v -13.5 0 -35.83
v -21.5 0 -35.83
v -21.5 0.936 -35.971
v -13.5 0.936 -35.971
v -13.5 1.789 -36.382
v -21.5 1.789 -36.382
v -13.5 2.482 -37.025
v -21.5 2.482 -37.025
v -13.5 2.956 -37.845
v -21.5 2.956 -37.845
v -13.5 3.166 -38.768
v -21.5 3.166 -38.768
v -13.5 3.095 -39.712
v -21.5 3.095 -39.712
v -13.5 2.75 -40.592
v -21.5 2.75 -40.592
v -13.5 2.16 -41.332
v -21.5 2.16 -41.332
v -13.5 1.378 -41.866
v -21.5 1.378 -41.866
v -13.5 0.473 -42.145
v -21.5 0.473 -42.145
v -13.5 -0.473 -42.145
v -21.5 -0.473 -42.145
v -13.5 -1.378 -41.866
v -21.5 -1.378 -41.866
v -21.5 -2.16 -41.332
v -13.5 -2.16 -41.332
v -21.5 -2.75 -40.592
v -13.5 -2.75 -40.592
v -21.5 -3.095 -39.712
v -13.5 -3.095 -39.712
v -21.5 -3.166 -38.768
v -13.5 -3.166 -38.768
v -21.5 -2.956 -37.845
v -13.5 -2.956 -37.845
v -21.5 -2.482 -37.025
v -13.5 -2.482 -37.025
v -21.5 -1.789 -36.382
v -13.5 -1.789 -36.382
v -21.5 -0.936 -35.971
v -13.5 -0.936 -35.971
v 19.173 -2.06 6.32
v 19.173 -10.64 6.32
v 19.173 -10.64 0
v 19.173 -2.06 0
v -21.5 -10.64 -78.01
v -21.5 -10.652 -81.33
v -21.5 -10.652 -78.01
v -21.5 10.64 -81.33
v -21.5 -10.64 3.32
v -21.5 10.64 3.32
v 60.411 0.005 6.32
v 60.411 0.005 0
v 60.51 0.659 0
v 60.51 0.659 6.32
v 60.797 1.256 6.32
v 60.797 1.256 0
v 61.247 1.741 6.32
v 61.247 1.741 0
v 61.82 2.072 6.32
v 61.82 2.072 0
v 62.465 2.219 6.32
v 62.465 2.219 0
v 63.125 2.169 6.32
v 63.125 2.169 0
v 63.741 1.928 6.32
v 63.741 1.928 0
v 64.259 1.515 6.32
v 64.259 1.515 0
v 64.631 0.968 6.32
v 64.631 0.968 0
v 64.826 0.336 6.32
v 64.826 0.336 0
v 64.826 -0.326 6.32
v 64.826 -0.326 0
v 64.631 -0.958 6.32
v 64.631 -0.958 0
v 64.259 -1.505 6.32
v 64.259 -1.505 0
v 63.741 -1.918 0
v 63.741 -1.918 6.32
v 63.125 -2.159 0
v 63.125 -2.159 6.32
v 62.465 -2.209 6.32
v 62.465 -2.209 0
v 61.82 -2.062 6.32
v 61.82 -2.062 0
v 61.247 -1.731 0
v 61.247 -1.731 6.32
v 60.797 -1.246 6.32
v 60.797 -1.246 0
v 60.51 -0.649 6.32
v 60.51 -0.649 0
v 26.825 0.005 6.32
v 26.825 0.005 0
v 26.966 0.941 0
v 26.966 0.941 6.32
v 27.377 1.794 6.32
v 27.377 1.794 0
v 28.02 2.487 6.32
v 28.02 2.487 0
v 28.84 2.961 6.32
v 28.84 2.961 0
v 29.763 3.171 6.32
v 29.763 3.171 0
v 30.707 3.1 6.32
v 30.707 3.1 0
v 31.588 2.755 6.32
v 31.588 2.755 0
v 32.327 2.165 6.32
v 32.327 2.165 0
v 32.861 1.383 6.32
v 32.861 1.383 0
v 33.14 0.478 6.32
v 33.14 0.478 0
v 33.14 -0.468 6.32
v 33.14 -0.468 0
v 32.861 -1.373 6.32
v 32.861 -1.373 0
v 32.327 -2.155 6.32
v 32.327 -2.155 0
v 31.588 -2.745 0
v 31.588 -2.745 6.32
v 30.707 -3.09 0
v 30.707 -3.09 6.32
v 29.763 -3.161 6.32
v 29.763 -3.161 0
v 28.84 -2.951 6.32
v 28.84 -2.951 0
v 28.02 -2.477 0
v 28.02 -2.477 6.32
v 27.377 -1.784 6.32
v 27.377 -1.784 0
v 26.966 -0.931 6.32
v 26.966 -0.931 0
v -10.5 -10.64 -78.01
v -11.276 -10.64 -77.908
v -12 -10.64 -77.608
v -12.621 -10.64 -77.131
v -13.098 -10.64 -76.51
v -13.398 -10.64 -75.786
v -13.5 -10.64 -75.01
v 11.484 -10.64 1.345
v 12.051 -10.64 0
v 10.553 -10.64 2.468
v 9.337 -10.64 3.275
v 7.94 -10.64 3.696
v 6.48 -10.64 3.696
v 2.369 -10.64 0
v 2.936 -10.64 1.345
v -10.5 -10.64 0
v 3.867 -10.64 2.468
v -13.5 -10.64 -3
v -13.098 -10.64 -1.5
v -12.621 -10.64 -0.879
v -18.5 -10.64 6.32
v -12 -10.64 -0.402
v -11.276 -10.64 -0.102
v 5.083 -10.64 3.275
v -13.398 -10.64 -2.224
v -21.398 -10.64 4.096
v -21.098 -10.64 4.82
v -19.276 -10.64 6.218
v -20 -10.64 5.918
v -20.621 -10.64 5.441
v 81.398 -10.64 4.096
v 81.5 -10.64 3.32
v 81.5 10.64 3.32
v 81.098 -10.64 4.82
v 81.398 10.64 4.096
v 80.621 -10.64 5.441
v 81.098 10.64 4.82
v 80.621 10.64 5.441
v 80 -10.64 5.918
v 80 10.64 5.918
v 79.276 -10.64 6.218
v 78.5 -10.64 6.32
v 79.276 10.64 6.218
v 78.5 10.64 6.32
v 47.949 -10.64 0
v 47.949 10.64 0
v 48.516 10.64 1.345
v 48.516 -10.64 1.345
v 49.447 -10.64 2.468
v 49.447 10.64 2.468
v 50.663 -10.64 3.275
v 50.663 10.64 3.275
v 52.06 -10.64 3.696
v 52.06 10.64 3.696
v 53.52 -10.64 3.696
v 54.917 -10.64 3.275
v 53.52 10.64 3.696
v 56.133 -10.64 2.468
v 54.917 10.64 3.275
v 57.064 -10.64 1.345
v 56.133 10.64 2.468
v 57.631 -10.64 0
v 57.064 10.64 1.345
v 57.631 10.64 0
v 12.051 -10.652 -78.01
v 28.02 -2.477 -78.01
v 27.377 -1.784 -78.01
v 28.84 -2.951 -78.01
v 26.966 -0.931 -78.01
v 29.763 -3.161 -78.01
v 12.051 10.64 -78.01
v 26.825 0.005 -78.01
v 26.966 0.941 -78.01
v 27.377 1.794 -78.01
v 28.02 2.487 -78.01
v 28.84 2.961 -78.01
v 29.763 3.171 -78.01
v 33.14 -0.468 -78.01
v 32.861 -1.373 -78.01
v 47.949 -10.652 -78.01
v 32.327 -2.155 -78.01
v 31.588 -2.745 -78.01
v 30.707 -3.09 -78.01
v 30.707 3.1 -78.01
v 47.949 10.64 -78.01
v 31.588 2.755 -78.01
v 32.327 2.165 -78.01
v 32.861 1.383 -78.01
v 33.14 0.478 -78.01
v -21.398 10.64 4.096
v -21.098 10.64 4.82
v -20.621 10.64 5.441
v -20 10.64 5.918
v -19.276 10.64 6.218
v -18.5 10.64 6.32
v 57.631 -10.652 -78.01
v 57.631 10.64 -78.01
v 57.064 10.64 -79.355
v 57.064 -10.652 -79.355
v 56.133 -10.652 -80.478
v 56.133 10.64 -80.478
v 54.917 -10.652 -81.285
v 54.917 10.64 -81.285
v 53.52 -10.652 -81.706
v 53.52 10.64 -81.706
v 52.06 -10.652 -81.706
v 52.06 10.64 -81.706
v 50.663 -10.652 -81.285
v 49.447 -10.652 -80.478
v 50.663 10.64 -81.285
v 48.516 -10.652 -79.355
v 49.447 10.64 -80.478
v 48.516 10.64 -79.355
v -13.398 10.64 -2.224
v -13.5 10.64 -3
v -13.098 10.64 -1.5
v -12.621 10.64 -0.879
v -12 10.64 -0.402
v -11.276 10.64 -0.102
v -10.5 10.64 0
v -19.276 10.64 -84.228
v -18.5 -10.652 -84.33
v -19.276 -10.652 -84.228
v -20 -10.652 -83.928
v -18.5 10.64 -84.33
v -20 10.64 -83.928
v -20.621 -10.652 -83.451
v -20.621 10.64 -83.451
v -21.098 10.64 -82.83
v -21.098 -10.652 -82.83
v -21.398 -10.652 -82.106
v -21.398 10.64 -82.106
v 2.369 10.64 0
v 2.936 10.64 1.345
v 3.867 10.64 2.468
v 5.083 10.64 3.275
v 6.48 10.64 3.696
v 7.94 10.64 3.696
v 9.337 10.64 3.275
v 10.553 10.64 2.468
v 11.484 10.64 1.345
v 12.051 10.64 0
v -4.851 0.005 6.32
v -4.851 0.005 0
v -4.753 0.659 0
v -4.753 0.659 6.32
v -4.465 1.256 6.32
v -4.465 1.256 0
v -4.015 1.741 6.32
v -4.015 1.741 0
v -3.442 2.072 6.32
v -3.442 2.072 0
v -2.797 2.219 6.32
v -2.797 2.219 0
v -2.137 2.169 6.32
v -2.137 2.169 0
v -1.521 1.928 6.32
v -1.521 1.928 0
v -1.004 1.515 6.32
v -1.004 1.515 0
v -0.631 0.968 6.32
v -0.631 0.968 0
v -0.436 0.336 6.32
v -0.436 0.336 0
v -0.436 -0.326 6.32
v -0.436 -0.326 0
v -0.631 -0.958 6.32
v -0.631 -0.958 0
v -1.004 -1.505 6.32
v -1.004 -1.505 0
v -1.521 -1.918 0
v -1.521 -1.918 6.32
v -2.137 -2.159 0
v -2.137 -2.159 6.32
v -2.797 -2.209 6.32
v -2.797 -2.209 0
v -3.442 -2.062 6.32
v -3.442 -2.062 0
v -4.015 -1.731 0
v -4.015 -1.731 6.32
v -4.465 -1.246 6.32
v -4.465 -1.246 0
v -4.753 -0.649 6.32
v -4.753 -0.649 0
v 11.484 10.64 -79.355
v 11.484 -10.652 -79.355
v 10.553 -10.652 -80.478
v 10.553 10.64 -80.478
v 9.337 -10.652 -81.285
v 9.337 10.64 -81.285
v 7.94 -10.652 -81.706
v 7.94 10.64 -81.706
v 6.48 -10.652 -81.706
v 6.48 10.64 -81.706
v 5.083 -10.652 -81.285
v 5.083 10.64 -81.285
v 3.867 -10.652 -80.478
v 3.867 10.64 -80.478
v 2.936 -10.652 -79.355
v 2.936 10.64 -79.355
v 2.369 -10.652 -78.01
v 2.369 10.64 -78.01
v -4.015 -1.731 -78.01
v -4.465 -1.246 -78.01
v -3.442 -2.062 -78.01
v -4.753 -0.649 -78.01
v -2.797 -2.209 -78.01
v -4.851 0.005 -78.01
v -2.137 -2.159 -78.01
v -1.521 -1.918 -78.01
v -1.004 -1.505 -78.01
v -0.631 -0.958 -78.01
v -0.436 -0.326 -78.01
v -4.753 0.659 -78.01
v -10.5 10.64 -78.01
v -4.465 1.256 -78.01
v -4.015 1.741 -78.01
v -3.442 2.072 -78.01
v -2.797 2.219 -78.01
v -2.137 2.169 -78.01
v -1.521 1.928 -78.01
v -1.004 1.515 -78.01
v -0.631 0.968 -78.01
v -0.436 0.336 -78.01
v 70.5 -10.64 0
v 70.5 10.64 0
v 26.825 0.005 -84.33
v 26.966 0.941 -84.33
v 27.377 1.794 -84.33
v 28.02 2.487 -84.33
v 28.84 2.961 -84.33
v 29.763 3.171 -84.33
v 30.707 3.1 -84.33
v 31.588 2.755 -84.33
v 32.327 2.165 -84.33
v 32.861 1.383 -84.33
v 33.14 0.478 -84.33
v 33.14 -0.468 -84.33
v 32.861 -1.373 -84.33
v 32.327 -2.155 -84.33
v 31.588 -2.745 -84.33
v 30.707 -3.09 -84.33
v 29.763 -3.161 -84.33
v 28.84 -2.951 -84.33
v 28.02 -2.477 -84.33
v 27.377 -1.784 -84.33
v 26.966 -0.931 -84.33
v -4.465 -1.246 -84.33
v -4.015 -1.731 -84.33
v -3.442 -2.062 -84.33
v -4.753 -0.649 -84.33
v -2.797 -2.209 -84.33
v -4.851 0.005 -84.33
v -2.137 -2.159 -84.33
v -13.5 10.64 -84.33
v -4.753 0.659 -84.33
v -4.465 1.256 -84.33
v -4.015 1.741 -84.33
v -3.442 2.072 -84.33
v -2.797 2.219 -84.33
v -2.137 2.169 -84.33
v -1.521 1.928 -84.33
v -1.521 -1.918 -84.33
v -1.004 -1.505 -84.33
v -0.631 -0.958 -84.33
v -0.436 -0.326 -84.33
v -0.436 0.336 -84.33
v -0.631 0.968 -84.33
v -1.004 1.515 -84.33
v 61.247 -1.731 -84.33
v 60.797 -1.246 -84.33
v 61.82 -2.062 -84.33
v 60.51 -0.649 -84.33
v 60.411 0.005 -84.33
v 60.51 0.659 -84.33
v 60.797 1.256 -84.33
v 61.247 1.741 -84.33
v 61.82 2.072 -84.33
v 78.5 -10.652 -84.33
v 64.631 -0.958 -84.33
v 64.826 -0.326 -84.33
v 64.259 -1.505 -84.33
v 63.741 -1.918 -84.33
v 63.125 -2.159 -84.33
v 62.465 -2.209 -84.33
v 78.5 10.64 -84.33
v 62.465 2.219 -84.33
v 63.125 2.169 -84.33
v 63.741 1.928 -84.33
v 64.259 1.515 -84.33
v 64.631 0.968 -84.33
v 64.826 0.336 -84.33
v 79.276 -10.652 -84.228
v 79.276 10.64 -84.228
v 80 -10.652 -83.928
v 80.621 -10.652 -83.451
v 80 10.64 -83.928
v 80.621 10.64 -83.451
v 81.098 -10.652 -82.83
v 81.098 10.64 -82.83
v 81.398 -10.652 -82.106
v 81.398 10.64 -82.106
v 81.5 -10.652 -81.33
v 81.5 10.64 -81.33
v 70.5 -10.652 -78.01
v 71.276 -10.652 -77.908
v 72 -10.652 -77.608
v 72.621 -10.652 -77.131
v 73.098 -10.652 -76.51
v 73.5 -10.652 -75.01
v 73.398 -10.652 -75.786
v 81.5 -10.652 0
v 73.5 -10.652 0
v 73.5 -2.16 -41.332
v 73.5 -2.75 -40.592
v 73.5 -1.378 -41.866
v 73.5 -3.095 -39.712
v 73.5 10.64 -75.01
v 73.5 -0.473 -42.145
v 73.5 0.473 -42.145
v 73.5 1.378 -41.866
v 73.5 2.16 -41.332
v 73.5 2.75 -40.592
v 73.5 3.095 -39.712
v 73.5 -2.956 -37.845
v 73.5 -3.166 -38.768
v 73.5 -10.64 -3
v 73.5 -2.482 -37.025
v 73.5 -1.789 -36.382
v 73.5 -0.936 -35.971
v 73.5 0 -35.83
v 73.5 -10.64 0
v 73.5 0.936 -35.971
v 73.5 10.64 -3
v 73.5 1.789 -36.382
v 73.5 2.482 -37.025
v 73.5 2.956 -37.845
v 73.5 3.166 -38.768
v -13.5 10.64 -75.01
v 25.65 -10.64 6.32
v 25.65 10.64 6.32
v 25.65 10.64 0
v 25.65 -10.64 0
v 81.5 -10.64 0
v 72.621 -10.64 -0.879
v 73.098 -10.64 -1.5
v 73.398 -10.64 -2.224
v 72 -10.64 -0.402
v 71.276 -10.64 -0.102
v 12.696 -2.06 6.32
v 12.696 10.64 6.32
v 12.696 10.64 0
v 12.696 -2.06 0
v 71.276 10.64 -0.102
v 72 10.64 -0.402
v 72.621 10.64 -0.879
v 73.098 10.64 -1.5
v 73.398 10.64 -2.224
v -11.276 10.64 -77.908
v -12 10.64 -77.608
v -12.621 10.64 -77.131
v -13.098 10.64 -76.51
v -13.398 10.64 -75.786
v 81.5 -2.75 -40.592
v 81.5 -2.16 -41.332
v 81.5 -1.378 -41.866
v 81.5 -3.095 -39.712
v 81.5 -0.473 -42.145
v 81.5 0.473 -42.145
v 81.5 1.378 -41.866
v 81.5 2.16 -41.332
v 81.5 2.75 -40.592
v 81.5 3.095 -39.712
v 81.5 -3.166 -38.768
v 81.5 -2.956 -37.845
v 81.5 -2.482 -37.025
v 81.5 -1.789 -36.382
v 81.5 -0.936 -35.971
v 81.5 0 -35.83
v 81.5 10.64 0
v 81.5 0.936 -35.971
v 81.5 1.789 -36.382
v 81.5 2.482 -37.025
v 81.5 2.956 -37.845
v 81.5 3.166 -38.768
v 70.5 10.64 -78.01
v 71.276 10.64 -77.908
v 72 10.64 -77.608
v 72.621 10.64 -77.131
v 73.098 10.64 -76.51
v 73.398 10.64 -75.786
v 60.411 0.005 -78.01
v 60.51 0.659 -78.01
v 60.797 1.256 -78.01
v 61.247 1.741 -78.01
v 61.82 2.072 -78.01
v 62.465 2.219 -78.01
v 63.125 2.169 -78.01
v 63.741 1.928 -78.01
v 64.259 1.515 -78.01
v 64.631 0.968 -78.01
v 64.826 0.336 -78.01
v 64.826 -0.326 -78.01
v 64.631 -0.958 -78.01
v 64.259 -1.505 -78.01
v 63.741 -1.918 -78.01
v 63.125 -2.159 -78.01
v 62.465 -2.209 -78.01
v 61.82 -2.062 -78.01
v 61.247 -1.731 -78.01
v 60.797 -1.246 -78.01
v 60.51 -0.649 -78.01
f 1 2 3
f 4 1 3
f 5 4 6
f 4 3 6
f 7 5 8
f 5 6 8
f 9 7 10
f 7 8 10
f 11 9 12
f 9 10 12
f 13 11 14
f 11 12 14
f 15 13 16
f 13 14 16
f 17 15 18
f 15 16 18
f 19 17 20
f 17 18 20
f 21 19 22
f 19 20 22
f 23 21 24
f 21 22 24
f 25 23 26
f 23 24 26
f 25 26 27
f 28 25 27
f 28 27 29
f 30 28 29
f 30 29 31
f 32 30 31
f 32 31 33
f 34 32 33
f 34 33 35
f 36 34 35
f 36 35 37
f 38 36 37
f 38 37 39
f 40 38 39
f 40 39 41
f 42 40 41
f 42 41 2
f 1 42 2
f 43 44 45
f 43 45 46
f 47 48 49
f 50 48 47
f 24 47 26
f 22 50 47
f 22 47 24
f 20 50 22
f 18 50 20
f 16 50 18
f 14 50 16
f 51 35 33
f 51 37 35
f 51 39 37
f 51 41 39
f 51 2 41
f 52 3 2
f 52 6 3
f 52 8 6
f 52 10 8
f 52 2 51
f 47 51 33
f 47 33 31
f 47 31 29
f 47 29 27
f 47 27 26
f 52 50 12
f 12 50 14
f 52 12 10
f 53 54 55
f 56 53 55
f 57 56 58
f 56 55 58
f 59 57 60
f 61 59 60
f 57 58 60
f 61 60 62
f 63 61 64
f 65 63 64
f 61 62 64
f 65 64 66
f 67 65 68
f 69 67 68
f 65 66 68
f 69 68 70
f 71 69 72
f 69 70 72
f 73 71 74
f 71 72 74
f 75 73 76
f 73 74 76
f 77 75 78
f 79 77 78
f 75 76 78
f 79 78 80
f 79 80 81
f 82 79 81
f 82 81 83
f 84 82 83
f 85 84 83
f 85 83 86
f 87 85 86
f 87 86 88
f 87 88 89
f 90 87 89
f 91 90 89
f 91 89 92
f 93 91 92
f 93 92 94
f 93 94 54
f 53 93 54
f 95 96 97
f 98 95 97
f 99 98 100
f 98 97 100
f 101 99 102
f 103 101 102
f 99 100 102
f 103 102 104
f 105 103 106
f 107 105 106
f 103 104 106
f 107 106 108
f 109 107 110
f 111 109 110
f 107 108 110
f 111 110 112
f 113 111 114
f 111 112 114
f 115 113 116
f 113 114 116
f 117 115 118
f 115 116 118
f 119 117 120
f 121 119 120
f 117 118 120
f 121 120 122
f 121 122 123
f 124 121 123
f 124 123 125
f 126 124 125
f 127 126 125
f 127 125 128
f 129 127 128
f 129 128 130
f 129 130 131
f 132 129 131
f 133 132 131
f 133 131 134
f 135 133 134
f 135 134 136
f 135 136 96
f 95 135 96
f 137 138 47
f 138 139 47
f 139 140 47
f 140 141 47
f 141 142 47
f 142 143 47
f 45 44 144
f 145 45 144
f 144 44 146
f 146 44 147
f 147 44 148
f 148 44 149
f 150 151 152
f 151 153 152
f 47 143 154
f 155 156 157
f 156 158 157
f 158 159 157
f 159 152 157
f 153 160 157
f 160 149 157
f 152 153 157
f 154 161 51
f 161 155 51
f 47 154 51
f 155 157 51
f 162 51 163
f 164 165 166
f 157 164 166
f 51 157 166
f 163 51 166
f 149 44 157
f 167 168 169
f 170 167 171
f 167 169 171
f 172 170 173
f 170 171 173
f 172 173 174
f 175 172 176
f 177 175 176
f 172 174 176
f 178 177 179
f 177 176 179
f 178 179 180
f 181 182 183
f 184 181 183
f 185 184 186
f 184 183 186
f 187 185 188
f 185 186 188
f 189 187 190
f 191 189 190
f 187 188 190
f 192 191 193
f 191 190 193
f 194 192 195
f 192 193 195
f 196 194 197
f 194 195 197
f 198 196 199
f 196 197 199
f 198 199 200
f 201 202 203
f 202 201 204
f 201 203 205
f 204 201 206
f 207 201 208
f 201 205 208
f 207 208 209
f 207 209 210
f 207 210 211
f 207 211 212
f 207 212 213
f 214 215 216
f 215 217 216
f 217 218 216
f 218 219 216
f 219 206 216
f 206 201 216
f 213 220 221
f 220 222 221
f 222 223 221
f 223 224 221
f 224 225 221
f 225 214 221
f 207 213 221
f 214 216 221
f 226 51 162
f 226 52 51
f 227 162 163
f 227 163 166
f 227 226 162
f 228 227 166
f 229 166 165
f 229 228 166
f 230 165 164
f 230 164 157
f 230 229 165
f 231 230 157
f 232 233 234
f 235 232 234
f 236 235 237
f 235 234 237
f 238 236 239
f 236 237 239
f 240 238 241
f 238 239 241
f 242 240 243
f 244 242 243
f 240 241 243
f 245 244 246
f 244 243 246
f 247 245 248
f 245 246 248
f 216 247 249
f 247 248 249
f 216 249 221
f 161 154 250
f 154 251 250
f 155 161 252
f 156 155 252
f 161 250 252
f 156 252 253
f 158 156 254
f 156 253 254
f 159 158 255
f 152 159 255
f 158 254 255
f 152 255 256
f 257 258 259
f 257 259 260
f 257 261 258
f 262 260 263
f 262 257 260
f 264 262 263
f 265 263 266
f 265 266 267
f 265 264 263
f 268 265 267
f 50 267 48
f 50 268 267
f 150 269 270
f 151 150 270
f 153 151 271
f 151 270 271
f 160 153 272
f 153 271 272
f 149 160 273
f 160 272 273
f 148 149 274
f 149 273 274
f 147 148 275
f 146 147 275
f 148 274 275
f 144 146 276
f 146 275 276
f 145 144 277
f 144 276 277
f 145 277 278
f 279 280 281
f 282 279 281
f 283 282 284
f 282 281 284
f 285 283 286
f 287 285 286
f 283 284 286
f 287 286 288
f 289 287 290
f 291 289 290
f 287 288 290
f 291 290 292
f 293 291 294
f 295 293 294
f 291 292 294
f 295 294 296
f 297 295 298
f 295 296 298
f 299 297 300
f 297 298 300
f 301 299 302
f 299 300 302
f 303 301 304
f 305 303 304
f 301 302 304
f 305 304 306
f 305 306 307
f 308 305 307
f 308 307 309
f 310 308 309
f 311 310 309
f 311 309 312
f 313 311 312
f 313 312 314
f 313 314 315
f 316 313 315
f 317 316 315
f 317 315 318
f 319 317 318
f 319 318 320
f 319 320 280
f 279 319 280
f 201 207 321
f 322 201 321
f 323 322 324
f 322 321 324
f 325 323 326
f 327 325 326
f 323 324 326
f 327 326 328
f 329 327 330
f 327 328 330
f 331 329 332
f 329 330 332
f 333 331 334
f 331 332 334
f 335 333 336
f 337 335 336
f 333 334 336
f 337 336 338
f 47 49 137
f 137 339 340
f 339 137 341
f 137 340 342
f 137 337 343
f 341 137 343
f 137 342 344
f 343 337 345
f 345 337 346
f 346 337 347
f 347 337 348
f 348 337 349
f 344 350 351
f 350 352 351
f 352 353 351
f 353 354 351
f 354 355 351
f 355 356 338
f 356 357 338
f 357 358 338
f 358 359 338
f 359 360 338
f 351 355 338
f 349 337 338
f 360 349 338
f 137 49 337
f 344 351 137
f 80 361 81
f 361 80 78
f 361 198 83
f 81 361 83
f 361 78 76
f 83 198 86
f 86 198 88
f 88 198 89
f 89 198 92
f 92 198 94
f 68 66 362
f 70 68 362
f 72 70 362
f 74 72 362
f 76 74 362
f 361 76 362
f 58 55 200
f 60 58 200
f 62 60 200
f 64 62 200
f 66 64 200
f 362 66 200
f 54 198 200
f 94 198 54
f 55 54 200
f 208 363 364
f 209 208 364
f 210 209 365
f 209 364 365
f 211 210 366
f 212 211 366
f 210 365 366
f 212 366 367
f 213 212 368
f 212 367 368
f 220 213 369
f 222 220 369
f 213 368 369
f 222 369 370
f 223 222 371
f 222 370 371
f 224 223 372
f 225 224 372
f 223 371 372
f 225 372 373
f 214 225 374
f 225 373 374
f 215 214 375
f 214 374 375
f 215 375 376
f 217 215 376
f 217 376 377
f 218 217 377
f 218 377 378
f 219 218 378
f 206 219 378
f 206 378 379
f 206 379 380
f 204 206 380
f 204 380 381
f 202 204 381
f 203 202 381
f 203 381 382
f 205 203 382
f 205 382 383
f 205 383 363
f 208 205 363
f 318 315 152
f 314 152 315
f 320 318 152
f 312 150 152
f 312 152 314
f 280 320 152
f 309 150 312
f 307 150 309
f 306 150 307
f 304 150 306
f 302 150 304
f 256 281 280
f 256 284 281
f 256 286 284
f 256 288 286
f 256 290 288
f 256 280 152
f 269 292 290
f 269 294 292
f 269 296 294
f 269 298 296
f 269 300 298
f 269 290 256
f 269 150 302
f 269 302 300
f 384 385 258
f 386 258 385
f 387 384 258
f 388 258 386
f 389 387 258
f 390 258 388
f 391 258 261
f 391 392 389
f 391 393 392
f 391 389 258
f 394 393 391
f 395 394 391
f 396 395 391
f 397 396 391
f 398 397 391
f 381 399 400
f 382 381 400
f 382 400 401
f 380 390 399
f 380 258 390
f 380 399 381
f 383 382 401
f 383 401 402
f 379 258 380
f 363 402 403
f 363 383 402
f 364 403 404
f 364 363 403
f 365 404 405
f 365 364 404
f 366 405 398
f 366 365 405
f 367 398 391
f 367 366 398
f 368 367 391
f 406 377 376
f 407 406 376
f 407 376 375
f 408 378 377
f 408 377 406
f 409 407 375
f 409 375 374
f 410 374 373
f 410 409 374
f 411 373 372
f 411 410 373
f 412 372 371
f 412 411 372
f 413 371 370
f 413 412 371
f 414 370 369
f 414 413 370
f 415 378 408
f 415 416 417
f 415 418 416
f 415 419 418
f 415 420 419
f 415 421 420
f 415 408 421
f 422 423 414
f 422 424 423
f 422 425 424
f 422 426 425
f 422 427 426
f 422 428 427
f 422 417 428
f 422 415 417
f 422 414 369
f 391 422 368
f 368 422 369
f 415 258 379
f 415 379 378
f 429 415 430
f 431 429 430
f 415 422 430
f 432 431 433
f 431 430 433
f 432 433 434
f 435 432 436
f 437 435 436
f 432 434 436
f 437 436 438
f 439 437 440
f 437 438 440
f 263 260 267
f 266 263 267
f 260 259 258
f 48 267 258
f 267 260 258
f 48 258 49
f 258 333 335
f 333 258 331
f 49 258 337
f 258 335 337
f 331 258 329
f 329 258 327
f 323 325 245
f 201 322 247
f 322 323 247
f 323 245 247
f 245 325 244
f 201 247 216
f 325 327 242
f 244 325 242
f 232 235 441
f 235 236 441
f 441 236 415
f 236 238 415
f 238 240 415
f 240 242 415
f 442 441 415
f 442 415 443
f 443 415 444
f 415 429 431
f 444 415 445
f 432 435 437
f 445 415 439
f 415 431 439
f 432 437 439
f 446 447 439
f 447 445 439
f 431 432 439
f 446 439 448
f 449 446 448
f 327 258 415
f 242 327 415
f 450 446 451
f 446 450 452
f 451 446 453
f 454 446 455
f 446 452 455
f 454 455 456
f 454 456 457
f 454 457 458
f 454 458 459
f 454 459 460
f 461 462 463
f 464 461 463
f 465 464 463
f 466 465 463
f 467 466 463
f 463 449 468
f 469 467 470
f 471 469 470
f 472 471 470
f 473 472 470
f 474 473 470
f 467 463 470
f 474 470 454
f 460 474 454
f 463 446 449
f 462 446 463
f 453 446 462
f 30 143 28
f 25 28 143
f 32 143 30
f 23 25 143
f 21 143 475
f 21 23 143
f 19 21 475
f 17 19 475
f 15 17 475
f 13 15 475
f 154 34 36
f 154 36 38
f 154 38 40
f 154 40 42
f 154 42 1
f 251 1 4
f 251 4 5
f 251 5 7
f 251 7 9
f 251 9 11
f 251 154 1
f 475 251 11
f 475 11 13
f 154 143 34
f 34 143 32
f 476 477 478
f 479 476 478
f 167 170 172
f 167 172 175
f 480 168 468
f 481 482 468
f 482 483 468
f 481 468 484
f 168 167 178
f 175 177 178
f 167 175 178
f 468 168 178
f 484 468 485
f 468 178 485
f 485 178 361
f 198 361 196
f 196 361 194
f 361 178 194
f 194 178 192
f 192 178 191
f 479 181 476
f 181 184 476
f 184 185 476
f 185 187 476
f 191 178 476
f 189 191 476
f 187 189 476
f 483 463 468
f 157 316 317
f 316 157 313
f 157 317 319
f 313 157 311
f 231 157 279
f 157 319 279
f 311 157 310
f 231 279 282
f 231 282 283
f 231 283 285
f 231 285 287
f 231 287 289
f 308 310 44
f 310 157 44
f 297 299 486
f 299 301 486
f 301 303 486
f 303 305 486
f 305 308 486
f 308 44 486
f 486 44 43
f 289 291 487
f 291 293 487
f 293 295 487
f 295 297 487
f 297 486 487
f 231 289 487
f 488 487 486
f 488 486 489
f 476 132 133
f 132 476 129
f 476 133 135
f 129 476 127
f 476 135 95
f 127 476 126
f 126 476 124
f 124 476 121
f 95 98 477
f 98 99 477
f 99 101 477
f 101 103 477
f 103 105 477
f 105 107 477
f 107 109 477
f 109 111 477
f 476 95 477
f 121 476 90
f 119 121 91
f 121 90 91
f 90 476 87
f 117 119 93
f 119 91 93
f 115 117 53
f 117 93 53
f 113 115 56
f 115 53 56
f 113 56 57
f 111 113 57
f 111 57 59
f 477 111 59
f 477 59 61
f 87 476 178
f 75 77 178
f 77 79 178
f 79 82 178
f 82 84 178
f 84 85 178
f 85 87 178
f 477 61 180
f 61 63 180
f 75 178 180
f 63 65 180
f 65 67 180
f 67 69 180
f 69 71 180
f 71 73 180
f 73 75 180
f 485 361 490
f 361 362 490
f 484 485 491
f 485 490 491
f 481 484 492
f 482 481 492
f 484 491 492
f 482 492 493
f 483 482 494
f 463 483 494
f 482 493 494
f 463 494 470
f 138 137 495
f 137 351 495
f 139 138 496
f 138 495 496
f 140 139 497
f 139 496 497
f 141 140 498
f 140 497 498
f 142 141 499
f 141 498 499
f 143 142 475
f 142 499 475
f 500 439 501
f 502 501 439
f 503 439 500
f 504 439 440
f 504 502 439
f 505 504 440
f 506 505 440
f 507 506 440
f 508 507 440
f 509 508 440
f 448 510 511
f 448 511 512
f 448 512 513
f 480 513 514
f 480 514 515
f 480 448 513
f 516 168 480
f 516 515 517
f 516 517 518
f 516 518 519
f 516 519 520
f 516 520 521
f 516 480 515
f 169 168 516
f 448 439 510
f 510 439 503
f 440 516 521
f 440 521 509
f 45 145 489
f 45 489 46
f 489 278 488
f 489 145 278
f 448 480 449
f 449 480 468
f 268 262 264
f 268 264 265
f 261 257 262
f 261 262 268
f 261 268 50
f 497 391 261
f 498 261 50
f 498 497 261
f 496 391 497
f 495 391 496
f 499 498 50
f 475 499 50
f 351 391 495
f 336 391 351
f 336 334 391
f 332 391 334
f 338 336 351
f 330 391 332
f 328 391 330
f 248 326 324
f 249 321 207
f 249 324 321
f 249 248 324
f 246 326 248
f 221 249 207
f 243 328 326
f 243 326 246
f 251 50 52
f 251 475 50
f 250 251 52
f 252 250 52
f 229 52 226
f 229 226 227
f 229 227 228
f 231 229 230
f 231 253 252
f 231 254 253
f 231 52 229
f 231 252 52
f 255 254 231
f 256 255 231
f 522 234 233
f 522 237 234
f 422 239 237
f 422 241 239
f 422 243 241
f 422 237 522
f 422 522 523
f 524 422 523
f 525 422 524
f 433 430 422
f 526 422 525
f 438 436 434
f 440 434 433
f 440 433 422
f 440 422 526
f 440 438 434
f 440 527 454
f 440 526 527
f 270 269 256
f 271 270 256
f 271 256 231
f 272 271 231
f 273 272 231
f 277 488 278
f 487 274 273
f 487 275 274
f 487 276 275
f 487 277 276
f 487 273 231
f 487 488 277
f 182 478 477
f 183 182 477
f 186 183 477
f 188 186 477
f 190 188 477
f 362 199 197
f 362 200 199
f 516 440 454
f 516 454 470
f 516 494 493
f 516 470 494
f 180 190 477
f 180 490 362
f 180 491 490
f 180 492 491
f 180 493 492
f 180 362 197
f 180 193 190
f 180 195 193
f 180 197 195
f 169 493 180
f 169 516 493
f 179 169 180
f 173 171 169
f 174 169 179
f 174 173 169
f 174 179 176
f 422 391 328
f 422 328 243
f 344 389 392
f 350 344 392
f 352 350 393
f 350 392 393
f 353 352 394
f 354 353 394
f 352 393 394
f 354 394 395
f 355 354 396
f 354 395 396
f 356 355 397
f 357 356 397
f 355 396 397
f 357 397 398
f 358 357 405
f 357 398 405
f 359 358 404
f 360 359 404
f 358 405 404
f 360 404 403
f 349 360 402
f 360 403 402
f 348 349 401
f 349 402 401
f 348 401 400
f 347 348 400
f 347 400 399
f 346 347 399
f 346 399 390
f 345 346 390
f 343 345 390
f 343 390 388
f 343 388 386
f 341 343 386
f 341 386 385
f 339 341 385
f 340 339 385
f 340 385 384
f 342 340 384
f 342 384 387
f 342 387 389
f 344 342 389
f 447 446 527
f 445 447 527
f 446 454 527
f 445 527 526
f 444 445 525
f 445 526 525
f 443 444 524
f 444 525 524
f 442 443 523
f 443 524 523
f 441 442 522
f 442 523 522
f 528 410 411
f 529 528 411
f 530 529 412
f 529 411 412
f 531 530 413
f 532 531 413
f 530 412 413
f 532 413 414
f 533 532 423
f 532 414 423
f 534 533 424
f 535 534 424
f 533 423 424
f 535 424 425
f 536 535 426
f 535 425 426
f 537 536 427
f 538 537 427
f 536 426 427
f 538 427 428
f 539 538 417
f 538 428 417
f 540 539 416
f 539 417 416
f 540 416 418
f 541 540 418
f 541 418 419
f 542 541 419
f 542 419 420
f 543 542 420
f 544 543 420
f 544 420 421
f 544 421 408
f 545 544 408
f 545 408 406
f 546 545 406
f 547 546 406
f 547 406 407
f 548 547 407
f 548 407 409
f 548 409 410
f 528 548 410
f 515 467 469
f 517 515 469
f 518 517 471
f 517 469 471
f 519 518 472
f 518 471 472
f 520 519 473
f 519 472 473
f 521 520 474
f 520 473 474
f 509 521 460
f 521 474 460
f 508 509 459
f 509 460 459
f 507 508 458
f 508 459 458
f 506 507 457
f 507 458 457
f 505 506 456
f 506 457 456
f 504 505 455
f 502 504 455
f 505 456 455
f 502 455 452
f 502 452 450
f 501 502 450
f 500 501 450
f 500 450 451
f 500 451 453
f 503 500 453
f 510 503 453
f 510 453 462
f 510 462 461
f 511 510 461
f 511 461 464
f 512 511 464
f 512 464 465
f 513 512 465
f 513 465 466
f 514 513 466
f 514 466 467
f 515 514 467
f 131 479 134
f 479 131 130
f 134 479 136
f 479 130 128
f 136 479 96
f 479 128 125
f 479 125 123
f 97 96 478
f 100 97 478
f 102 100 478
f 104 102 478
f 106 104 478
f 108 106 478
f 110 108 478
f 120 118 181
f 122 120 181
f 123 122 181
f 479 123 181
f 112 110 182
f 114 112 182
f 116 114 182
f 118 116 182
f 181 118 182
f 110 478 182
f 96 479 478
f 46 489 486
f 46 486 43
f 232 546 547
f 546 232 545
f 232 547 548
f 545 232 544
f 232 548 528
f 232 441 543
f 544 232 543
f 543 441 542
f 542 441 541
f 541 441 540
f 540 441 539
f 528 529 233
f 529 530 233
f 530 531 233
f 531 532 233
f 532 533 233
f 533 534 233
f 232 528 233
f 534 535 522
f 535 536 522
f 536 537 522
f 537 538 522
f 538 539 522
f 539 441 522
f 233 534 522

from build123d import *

# Parameters (mm, degrees)
SKETCH1_W           = 60
SKETCH1_H           = 6.32
BOSS_EXTRUDE1_DEPTH = 10.64
SKETCH2_R           = 5
CUT_EXTRUDE1_DEPTH  = 64.974845056
SKETCH3_W           = 6.32
SKETCH3_H           = 21.28
BOSS_EXTRUDE2_DEPTH = 21.5
SKETCH4_W           = 6.32
SKETCH4_H           = 21.28
BOSS_EXTRUDE3_DEPTH = 21.5
SKETCH5_W           = 8
SKETCH5_H           = 21.28
BOSS_EXTRUDE6_DEPTH = 84.33
SKETCH6_W           = 8
SKETCH6_H           = 21.291954735
BOSS_EXTRUDE7_DEPTH = 84.33
SKETCH7_W           = 6.32
SKETCH7_H           = 21.291954735
BOSS_EXTRUDE8_DEPTH = 95
SKETCH9_R           = 5
CUT_EXTRUDE2_DEPTH  = 120.193734049
SKETCH10_R          = 2.22
CUT_EXTRUDE3_DEPTH  = 123.364768784
FILLET1_R           = 3
SKETCH13_R          = 3.175
CUT_EXTRUDE4_DEPTH  = 123.364768784
SKETCH17_W          = 12.954
SKETCH17_H          = 7.031857888
CUT_EXTRUDE7_DEPTH  = 12.7
CUT_EXTRUDE8_REACH  = 124.365
SKETCH18_W          = 6.477
SKETCH18_H          = 8.58
SKETCH19_R          = 3.175
CUT_EXTRUDE9_DEPTH  = 134.544049061


with BuildPart() as part:
    # Sketch1 → Boss-Extrude1 (new, symmetric)
    with BuildSketch(Plane(origin=(0, 0, 0), x_dir=(1, 0, 0), z_dir=(0, 1, 0))):
        with Locations((30, -3.16)):
            Rectangle(SKETCH1_W, SKETCH1_H)
    extrude(amount=BOSS_EXTRUDE1_DEPTH, both=True)

    # Sketch2 → Cut-Extrude1 (cut, through all)
    with BuildSketch(Plane(origin=(0, 10.64, 0), x_dir=(1, 0, 0), z_dir=(0, 1, 0))):
        with Locations((7.21, 1.25)):
            Circle(SKETCH2_R)
        with Locations((52.79, 1.25)):
            Circle(SKETCH2_R)
    extrude(amount=-CUT_EXTRUDE1_DEPTH, mode=Mode.SUBTRACT)

    # Sketch3 → Boss-Extrude2 (add)
    with BuildSketch(Plane(origin=(60, 0, 0), x_dir=(0, 0, -1), z_dir=(1, 0, 0))):
        with Locations((-3.16, 0)):
            Rectangle(SKETCH3_W, SKETCH3_H)
    extrude(amount=BOSS_EXTRUDE2_DEPTH)

    # Sketch4 → Boss-Extrude3 (add)
    with BuildSketch(Plane.ZY):
        with Locations((3.16, 0)):
            Rectangle(SKETCH4_W, SKETCH4_H)
    extrude(amount=BOSS_EXTRUDE3_DEPTH)

    # Sketch5 → Boss-Extrude6 (add)
    with BuildSketch(Plane(origin=(0, 0, 0), x_dir=(-1, 0, 0), z_dir=(0, 0, -1))):
        with Locations((17.5, 0)):
            Rectangle(SKETCH5_W, SKETCH5_H)
    extrude(amount=BOSS_EXTRUDE6_DEPTH)

    # Sketch6 → Boss-Extrude7 (add)
    with BuildSketch(Plane(origin=(0, 0, 0), x_dir=(-1, 0, 0), z_dir=(0, 0, -1))):
        with Locations((-77.5, -0.005977367)):
            Rectangle(SKETCH6_W, SKETCH6_H)
    extrude(amount=BOSS_EXTRUDE7_DEPTH)

    # Sketch7 → Boss-Extrude8 (add, through all)
    with BuildSketch(Plane.ZY.offset(-73.5)):
        with Locations((-81.17, -0.005977367)):
            Rectangle(SKETCH7_W, SKETCH7_H)
    extrude(amount=BOSS_EXTRUDE8_DEPTH)

    # Sketch9 → Cut-Extrude2 (cut, through all)
    with BuildSketch(Plane(origin=(0, 10.64, 0), x_dir=(1, 0, 0), z_dir=(0, 1, 0))):
        with Locations((7.21, 76.76)):
            Circle(SKETCH9_R)
        with Locations((52.79, 76.76)):
            Circle(SKETCH9_R)
    extrude(amount=-CUT_EXTRUDE2_DEPTH, mode=Mode.SUBTRACT)

    # Sketch10 → Cut-Extrude3 (cut, through all)
    with BuildSketch(Plane(origin=(0, 0, -84.33), x_dir=(-1, 0, 0), z_dir=(0, 0, -1))):
        with Locations((-62.631229183, 0.005)):
            Circle(SKETCH10_R)
        with Locations((2.631229183, 0.005)):
            Circle(SKETCH10_R)
    extrude(amount=-CUT_EXTRUDE3_DEPTH, mode=Mode.SUBTRACT)

    # Fillet1
    fillet1_edges = [part.edges().sort_by_distance(p)[0] for p in [
        (81.5, 0, 6.32),
        (-21.5, 0, 6.32),
        (-13.5, 0, 0),
        (-21.5, -0.005977367, -84.33),
        (73.5, 0, 0),
        (81.5, -0.005977367, -84.33),
        (-13.5, 0, -78.01),
        (73.5, -0.005977367, -78.01),
    ]]
    fillet(fillet1_edges, radius=FILLET1_R)

    # Sketch13 → Cut-Extrude4 (cut, through all)
    with BuildSketch(Plane(origin=(0, 0, -84.33), x_dir=(-1, 0, 0), z_dir=(0, 0, -1))):
        with Locations((-30, 0.005)):
            Circle(SKETCH13_R)
    extrude(amount=-CUT_EXTRUDE4_DEPTH, mode=Mode.SUBTRACT)

    # Sketch17 → Cut-Extrude7 (cut, symmetric)
    with BuildSketch(Plane(origin=(0, 10.64, 0), x_dir=(1, 0, 0), z_dir=(0, 1, 0))):
        with Locations((19.173393665, -2.929761462)):
            Rectangle(SKETCH17_W, SKETCH17_H)
    extrude(amount=CUT_EXTRUDE7_DEPTH, both=True, mode=Mode.SUBTRACT)

    # Sketch18 → Cut-Extrude8 (cut, up to next)
    with BuildSketch(Plane.XY.offset(6.32), mode=Mode.PRIVATE) as cut_extrude8_sk1:
        with Locations((22.411893665, -6.35)):
            Rectangle(SKETCH18_W, SKETCH18_H)
    cut_extrude8_tool1 = extrude(cut_extrude8_sk1.sketch, amount=-CUT_EXTRUDE8_REACH, mode=Mode.PRIVATE) & part.part
    add(cut_extrude8_tool1.solids().sort_by_distance((22.411894, -6.35, 6.32))[0], mode=Mode.SUBTRACT)

    # Sketch19 → Cut-Extrude9 (cut, through all)
    with BuildSketch(Plane.ZY.offset(21.5)):
        with Locations((-39.005, 0)):
            Circle(SKETCH19_R)
    extrude(amount=-CUT_EXTRUDE9_DEPTH, mode=Mode.SUBTRACT)


solid = part.part
